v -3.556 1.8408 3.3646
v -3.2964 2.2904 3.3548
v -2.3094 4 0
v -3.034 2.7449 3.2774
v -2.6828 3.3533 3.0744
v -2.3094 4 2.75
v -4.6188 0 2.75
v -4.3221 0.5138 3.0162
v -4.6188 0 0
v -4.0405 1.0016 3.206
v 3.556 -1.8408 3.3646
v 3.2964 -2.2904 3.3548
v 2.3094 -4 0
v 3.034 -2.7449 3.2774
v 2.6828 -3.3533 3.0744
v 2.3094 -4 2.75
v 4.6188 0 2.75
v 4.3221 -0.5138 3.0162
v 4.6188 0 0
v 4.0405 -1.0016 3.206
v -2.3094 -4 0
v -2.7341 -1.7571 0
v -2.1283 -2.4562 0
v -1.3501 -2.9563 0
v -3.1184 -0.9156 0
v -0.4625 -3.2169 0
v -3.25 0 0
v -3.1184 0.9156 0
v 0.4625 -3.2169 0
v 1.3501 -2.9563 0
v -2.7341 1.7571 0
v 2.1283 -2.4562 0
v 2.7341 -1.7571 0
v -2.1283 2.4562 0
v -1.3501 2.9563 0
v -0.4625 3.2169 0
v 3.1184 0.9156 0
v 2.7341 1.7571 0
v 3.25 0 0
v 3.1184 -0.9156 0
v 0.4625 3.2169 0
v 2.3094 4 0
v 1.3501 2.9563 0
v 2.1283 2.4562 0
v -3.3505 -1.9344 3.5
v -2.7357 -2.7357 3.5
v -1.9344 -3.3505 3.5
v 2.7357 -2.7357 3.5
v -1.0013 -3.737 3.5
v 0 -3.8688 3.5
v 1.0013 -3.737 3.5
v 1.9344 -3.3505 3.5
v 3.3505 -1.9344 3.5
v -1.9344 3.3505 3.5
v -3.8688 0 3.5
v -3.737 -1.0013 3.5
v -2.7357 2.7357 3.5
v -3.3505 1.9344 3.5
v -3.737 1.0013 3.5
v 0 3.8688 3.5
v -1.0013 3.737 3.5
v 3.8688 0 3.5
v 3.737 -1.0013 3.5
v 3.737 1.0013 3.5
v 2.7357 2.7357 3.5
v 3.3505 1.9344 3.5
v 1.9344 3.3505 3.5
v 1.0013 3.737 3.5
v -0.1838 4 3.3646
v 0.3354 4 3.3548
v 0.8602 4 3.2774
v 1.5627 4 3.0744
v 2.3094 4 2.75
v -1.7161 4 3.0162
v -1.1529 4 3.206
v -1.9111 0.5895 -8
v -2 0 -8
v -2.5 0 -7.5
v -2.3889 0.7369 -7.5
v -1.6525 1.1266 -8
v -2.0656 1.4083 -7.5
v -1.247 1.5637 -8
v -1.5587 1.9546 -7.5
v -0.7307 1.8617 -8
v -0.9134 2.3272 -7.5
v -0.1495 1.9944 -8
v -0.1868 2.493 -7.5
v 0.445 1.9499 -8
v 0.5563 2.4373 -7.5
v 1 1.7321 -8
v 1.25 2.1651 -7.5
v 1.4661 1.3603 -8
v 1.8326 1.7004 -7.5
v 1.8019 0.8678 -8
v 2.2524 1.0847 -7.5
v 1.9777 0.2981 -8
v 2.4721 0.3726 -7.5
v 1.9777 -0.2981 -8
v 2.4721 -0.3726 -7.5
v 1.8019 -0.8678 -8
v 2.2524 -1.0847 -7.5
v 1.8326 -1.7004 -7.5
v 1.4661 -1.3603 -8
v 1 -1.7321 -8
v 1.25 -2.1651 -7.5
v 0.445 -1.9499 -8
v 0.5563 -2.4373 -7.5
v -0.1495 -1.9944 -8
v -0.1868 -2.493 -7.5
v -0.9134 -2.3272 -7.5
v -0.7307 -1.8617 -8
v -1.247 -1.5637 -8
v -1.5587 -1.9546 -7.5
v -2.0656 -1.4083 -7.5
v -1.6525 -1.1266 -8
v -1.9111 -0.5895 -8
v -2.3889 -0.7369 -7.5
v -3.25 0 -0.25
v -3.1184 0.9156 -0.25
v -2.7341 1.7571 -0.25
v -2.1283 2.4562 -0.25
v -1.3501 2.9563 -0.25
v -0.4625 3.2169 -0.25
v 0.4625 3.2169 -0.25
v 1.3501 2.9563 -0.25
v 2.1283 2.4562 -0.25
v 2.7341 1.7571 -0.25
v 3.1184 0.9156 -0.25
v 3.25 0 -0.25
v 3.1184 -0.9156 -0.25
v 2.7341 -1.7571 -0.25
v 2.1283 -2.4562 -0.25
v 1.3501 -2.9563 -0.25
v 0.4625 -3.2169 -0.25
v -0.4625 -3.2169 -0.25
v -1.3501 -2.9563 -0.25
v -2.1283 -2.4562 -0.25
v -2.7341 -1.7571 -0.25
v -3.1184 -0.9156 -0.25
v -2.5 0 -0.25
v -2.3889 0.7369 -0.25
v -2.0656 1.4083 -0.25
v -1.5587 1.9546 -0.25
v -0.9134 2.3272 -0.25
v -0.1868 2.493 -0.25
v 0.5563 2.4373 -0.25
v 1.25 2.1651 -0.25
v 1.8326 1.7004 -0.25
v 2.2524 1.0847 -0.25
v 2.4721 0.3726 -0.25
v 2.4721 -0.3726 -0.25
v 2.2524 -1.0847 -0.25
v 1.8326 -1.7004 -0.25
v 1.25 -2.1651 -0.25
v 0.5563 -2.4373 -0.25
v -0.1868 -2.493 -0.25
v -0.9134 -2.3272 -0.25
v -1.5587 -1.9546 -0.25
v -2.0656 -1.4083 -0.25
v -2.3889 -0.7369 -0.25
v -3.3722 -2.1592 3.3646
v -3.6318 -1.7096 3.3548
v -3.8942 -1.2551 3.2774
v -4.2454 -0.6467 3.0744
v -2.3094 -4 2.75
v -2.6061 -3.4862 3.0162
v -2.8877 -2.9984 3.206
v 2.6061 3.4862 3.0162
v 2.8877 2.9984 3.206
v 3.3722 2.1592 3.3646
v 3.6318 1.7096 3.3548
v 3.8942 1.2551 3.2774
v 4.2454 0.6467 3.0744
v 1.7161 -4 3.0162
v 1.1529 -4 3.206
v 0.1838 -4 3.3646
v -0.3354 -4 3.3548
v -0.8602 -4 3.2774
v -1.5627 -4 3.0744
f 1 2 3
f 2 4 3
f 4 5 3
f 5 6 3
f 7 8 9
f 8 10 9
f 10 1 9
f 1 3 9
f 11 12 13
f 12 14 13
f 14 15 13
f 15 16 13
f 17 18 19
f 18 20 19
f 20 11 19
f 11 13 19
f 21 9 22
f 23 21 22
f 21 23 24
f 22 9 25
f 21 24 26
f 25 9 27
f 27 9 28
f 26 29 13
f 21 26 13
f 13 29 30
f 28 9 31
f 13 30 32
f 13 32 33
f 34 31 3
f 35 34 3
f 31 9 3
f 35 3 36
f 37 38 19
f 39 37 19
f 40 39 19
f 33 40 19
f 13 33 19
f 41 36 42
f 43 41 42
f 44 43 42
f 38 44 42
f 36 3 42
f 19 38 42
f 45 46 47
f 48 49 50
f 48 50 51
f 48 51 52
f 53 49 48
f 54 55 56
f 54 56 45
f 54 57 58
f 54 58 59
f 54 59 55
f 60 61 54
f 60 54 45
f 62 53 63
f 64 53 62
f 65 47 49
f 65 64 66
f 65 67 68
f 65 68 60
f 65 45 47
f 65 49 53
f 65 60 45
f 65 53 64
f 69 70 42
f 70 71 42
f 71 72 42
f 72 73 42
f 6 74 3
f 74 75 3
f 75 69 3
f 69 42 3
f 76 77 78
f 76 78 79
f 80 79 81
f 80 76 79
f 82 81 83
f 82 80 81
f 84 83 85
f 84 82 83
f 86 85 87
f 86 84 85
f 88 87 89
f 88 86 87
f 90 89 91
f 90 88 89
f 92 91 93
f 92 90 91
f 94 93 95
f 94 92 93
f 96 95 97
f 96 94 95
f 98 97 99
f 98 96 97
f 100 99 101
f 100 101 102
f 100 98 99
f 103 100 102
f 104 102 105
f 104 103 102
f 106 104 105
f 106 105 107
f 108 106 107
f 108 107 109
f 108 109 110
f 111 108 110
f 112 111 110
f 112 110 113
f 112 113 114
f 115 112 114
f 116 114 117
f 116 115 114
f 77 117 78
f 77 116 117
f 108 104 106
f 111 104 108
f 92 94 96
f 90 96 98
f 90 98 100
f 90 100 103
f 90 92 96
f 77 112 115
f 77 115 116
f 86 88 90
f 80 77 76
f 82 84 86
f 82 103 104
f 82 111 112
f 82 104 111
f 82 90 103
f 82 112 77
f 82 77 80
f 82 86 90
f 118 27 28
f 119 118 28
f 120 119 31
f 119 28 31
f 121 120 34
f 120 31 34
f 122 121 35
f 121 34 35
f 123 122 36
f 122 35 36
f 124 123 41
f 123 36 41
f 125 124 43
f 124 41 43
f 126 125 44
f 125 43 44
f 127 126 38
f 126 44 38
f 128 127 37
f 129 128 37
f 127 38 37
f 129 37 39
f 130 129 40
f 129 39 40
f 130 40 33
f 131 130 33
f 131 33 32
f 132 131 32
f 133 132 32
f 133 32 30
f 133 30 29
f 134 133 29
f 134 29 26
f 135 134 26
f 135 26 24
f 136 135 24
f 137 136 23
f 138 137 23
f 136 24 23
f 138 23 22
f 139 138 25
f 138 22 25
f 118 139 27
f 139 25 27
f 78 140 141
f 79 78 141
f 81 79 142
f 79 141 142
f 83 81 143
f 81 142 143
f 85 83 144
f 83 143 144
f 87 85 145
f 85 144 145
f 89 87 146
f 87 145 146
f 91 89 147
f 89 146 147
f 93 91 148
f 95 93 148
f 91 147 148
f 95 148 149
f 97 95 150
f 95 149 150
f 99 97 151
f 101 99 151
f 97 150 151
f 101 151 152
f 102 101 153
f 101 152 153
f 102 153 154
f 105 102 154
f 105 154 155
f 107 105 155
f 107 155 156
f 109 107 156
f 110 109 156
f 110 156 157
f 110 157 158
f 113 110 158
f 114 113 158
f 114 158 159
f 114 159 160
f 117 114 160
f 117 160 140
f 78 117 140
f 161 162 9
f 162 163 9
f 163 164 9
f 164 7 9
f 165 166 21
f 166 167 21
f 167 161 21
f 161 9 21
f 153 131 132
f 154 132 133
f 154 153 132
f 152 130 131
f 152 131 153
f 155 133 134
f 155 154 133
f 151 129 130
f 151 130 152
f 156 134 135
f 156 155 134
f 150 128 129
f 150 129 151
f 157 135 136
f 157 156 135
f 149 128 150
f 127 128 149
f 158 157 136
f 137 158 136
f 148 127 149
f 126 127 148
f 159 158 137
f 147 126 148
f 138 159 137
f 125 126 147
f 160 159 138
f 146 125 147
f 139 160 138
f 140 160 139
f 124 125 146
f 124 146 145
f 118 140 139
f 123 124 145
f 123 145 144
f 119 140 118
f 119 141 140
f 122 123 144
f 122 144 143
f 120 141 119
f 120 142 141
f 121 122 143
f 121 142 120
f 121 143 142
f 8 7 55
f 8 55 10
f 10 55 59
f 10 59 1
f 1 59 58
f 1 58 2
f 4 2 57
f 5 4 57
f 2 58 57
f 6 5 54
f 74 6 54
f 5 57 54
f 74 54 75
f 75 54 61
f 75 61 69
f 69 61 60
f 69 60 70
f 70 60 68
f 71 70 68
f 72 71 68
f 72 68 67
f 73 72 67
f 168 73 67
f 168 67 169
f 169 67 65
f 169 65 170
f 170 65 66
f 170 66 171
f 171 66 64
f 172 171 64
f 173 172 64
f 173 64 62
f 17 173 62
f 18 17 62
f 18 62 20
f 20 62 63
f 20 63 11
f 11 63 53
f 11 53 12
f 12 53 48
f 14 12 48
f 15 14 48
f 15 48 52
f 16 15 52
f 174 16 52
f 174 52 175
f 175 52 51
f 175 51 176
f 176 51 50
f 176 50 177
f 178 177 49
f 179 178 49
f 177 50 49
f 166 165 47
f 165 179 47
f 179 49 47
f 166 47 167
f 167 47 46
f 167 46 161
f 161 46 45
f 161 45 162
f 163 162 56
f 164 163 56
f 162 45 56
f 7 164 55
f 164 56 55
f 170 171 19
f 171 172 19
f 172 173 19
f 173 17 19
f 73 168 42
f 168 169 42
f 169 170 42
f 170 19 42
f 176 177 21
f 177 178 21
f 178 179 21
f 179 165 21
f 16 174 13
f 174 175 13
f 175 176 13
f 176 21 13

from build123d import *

# Parameters (mm, degrees)
BOSS_EXTRUDE1_DEPTH = 3.5
SKETCH3_R           = 3.25
BOSS_EXTRUDE3_DEPTH = 0.25
SKETCH2_R           = 2.5
BOSS_EXTRUDE2_DEPTH = 8
CHAMFER1_SIZE       = 0.5


with BuildPart() as part:
    # Sketch1 → Boss-Extrude1 (new body)
    with BuildSketch(Plane.XY):
        Polygon((4.618802154, 0), (2.309401077, 4), (-2.309401077, 4), (-4.618802154, 0), (-2.309401077, -4), (2.309401077, -4), align=None)
    extrude(amount=BOSS_EXTRUDE1_DEPTH)

    # Sketch3 → Boss-Extrude3 (add)
    with BuildSketch(Plane(origin=(0, 0, 0), x_dir=(-1, 0, 0), z_dir=(0, 0, -1))):
        Circle(SKETCH3_R)
    extrude(amount=BOSS_EXTRUDE3_DEPTH)

    # Sketch2 → Boss-Extrude2 (add)
    with BuildSketch(Plane(origin=(0, 0, 0), x_dir=(-1, 0, 0), z_dir=(0, 0, -1))):
        Circle(SKETCH2_R)
    extrude(amount=BOSS_EXTRUDE2_DEPTH)

    # Chamfer1
    chamfer1_edges = [part.edges().sort_by_distance(p)[0] for p in [
        (2.5, 0, -8),
    ]]
    chamfer(chamfer1_edges, length=CHAMFER1_SIZE)

    # Sketch4 → Cut-Revolve1 (revolve, cut)
    with BuildSketch(Plane(origin=(0, 0, 0), x_dir=(1, 0, 0), z_dir=(0, 1, 0))):
        Polygon((-4.868802154, -3.75), (-4.868802154, -2.5), (-3.618802154, -3.75), align=None)
    revolve(axis=Axis((0, 0, 3.5), (0, 0, -1)), mode=Mode.SUBTRACT)


solid = part.part
